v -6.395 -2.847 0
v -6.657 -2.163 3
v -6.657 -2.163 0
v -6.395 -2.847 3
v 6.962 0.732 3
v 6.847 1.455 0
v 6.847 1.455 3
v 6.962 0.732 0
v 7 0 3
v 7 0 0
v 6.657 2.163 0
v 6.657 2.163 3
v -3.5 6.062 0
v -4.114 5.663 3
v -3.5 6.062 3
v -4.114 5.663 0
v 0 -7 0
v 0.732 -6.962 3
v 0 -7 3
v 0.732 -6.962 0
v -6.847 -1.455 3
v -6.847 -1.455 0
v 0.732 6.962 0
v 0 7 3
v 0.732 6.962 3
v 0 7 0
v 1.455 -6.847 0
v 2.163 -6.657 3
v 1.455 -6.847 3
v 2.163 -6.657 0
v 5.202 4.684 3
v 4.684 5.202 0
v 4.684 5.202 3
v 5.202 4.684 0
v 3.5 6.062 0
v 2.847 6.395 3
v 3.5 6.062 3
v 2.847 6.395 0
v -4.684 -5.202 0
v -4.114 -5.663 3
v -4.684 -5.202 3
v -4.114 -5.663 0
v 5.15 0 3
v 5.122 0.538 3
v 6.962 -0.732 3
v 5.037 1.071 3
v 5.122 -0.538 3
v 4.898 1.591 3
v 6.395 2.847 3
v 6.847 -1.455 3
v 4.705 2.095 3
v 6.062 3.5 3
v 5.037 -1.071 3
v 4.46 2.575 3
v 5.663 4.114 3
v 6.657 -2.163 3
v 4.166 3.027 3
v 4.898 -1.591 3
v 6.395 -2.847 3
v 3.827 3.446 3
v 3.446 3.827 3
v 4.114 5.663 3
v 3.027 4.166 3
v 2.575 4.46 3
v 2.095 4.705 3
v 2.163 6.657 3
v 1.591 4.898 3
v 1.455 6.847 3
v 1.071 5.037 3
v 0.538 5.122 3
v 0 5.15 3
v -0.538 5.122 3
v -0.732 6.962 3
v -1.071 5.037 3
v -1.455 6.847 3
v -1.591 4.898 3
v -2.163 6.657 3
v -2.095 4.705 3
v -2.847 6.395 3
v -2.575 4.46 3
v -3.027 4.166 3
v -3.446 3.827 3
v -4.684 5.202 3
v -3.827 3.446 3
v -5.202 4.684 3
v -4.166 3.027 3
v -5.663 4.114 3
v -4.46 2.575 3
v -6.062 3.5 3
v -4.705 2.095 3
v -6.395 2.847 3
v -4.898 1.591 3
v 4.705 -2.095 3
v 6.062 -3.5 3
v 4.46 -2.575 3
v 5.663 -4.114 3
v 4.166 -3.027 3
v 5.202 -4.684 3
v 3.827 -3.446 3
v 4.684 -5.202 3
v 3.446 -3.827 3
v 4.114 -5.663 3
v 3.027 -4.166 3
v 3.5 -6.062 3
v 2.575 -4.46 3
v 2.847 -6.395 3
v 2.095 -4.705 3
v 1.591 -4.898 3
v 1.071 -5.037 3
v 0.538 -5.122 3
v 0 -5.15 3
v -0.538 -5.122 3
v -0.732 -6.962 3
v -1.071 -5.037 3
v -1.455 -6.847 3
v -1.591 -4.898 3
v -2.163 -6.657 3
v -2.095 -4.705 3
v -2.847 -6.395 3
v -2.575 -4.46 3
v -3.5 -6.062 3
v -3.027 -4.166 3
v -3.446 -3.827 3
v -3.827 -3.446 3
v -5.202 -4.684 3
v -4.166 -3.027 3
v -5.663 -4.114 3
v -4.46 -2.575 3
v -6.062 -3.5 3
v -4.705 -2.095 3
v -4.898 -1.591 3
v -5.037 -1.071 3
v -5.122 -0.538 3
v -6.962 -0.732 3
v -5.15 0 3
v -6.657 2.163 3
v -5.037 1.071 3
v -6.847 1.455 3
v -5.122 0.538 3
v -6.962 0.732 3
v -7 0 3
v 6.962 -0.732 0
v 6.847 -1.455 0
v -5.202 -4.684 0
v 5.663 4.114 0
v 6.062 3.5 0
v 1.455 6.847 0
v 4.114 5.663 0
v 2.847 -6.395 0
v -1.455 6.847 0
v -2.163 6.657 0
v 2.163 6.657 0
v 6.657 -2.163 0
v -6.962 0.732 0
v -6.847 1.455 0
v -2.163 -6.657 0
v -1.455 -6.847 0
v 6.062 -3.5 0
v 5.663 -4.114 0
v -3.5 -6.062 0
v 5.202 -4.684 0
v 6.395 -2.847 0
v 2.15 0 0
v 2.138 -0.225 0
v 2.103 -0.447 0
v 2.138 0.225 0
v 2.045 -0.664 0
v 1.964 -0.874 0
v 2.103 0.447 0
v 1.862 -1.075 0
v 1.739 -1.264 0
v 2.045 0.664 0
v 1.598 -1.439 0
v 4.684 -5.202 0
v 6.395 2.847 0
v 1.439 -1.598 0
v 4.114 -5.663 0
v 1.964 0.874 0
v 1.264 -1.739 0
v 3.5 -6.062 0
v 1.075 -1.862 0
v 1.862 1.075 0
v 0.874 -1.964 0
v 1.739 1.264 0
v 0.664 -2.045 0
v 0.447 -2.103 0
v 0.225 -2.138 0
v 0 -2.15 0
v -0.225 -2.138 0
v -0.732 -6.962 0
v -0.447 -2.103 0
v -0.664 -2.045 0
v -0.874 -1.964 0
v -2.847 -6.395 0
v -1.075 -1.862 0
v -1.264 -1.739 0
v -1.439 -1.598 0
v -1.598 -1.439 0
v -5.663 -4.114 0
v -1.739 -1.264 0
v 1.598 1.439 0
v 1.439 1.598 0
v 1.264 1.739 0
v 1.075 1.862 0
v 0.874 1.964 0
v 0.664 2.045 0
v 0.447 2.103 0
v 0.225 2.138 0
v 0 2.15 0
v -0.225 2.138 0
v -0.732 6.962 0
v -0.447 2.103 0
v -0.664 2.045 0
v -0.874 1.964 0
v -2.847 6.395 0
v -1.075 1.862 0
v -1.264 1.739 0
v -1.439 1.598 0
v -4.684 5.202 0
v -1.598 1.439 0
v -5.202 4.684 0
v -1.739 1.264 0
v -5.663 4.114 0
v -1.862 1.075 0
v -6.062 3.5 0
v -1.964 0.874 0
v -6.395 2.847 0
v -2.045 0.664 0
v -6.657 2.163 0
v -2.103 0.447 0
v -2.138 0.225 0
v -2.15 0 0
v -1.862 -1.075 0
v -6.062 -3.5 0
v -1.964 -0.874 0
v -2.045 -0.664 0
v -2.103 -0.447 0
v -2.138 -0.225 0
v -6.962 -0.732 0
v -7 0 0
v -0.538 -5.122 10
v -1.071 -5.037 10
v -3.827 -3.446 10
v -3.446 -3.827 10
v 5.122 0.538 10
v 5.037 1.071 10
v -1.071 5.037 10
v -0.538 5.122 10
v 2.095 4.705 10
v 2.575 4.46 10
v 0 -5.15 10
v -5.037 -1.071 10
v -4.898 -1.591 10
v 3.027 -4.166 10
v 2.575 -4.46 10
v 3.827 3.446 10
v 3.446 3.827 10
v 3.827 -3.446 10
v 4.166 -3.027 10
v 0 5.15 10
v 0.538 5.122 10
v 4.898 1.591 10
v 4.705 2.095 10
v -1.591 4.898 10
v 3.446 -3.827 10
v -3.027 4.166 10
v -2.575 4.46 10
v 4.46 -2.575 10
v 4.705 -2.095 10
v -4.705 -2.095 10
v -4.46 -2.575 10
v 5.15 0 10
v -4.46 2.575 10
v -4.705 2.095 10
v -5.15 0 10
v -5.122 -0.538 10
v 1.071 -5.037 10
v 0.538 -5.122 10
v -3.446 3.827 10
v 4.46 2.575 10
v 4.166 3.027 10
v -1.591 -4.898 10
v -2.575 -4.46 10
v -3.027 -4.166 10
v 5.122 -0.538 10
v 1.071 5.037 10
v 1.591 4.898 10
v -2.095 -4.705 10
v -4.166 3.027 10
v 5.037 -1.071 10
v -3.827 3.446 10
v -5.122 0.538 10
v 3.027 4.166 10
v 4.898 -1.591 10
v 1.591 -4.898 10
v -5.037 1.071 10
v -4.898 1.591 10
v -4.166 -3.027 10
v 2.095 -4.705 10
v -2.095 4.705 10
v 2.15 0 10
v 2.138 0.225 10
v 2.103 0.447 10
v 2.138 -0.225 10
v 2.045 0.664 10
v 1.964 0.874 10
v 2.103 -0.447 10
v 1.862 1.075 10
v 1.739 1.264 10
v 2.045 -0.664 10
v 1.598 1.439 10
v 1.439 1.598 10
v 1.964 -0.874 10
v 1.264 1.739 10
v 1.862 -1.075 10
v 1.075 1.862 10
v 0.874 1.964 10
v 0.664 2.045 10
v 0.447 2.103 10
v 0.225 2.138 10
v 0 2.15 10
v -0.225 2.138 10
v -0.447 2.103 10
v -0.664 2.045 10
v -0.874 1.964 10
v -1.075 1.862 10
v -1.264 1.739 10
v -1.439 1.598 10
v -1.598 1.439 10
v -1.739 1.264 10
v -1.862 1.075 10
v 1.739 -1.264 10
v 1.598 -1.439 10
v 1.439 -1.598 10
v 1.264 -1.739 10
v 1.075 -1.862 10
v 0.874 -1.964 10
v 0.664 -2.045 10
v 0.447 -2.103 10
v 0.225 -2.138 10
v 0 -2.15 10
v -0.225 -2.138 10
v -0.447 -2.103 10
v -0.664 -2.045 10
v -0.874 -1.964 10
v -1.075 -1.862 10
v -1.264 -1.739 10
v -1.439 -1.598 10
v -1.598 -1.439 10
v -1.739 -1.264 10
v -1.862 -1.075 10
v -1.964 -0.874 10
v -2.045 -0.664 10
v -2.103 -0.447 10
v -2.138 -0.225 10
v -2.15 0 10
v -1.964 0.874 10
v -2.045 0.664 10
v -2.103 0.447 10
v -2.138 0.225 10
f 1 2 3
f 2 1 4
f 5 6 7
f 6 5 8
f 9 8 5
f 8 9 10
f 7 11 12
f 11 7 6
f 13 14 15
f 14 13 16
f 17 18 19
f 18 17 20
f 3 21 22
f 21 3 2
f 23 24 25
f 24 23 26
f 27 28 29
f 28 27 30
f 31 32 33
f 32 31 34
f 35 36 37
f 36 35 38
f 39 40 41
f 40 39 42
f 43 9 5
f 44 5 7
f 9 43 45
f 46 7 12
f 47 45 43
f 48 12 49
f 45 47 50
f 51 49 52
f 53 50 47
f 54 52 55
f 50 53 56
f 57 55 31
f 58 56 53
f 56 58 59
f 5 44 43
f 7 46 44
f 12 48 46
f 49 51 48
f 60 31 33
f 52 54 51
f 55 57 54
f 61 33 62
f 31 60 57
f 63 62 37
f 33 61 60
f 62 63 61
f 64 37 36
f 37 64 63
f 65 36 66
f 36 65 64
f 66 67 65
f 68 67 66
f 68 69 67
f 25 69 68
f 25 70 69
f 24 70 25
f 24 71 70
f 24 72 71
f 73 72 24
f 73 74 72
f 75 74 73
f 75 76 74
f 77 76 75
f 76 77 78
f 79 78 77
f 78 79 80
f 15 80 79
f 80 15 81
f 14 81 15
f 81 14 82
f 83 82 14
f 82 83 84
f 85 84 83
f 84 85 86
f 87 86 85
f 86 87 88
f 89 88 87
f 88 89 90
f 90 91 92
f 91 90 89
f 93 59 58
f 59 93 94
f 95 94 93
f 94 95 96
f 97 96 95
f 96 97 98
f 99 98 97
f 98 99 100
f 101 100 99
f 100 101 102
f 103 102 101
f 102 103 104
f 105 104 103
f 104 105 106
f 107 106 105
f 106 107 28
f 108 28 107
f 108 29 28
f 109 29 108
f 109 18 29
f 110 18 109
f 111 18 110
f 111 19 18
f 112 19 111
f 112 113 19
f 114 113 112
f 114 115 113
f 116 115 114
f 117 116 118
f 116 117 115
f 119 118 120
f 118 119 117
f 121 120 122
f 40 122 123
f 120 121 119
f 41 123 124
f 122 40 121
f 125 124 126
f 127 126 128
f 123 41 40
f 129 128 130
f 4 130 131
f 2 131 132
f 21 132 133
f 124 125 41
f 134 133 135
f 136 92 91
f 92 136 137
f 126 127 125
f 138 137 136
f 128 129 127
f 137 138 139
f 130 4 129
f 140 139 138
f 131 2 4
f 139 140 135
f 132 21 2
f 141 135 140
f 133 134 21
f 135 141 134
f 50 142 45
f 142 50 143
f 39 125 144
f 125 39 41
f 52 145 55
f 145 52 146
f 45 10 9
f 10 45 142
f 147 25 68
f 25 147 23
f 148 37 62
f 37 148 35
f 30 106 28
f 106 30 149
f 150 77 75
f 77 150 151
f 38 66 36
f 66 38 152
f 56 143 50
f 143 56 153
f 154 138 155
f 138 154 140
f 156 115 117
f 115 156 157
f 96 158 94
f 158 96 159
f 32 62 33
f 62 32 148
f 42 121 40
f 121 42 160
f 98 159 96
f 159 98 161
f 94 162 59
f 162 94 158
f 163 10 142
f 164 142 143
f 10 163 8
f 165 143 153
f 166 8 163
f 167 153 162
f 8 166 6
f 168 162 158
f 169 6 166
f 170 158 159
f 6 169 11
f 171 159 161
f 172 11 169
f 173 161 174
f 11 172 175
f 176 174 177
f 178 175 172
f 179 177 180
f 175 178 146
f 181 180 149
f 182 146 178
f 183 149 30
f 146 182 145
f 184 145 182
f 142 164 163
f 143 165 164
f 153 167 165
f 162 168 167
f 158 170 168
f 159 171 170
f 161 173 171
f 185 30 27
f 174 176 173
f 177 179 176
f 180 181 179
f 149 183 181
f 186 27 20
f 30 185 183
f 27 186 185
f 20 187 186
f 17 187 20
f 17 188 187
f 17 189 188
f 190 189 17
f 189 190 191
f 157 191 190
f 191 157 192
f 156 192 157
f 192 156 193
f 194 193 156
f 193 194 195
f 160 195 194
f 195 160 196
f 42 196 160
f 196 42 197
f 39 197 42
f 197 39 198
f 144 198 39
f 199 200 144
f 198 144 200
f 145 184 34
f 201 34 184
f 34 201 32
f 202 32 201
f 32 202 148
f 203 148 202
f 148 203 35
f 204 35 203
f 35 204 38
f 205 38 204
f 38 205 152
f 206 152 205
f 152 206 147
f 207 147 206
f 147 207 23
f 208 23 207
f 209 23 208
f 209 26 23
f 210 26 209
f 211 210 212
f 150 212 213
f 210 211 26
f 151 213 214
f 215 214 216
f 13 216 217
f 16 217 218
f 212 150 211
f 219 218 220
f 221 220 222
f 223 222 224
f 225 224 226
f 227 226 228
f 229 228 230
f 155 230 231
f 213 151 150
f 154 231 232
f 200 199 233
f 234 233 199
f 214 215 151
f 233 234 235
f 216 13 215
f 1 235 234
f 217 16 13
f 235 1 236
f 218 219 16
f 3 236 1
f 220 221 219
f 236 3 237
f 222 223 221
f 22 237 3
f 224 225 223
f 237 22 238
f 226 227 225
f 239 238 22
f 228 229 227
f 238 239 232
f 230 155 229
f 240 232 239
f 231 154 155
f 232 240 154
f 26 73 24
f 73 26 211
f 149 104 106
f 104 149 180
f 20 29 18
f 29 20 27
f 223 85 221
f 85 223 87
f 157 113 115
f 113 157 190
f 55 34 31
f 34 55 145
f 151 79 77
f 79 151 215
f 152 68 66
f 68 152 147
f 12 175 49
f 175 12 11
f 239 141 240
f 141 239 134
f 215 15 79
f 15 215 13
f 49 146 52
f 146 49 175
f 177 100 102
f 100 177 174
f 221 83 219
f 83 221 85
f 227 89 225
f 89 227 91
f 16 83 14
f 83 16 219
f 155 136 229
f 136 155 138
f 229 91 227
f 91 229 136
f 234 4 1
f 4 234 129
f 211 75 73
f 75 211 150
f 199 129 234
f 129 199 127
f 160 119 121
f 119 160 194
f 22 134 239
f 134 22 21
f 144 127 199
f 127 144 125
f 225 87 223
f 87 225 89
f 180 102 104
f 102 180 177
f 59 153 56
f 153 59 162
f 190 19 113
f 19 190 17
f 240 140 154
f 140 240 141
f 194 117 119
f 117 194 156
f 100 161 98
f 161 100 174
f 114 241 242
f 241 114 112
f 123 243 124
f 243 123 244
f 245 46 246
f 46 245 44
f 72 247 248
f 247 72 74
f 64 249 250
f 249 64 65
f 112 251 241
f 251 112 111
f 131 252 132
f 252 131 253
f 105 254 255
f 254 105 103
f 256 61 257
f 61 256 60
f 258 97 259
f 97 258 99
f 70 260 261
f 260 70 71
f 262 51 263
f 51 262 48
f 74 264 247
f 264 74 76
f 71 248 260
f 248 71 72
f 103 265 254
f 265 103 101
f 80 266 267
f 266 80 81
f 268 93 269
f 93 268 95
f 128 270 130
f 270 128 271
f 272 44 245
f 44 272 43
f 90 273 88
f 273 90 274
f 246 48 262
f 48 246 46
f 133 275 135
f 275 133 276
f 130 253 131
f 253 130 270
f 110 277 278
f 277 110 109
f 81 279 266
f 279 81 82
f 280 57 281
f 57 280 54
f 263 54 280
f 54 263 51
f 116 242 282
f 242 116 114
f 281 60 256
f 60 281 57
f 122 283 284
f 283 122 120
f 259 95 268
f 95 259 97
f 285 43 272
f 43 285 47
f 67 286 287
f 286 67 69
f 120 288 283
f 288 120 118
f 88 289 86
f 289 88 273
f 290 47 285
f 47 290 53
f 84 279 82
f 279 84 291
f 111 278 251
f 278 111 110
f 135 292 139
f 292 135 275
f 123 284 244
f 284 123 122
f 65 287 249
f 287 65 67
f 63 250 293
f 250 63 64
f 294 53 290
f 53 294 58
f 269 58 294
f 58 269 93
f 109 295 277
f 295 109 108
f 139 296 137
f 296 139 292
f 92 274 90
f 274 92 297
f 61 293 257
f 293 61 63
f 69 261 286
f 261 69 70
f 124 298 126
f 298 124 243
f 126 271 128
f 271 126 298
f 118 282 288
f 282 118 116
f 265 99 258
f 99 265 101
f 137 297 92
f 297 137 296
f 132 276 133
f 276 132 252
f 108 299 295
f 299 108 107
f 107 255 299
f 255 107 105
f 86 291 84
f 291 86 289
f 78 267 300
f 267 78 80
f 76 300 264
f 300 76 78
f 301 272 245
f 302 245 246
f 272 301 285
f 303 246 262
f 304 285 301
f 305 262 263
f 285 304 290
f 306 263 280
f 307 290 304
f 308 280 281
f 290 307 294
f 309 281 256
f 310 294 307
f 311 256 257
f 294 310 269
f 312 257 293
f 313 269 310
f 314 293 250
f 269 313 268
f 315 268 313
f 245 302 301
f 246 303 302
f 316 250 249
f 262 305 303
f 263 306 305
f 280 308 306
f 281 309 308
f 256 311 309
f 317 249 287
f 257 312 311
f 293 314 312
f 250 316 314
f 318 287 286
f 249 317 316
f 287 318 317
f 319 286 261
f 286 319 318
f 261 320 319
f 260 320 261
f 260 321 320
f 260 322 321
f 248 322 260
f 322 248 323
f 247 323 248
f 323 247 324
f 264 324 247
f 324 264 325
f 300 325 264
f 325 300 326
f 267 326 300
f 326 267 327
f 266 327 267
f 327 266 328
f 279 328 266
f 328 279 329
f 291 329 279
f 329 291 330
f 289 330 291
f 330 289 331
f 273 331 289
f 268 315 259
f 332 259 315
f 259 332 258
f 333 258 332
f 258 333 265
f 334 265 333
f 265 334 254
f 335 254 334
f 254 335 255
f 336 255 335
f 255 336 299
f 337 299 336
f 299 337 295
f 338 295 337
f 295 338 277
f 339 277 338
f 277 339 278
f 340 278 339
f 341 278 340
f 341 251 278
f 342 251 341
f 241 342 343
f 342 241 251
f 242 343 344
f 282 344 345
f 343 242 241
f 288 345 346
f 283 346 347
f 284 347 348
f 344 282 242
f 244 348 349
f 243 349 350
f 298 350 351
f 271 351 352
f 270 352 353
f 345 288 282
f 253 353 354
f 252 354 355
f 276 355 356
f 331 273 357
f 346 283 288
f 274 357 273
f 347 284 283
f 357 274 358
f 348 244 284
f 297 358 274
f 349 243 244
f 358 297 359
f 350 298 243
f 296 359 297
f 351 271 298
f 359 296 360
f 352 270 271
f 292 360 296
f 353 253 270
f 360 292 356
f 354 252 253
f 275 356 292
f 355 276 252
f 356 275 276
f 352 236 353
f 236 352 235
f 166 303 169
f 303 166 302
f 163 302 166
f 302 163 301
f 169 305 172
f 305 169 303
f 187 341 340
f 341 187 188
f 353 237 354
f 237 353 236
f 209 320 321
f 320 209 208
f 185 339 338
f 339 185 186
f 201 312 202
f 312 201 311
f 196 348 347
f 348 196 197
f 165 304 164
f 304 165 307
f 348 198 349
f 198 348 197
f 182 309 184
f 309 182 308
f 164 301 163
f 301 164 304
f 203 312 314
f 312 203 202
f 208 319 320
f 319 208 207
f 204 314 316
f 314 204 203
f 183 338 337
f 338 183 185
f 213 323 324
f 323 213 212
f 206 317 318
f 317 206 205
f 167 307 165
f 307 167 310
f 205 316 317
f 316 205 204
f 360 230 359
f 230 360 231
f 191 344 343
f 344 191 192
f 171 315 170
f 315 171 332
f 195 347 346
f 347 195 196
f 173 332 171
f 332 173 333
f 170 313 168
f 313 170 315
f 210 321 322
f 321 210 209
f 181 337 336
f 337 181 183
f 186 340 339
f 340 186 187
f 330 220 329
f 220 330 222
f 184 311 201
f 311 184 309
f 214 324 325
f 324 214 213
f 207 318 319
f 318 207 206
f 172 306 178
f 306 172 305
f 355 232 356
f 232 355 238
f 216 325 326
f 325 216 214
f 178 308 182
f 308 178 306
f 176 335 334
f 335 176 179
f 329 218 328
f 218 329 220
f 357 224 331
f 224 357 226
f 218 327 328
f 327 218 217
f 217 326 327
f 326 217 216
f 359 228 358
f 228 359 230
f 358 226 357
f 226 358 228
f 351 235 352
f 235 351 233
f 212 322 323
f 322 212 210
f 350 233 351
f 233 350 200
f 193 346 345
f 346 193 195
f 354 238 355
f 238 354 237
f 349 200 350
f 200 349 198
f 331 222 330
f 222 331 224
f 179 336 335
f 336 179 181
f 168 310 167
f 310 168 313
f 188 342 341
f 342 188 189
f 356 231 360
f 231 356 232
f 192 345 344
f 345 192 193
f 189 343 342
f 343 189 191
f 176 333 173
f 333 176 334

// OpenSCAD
// Threaded mounting boss.
$fn = 60;
eps = 0.02;
thread_d = 4.3;
base_d = 14;
height = 10;
difference() { union() { cylinder(d=base_d,h=3); cylinder(d=thread_d+6,h=height); } translate([0,0,-eps]) cylinder(d=thread_d,h=height+2*eps); }
